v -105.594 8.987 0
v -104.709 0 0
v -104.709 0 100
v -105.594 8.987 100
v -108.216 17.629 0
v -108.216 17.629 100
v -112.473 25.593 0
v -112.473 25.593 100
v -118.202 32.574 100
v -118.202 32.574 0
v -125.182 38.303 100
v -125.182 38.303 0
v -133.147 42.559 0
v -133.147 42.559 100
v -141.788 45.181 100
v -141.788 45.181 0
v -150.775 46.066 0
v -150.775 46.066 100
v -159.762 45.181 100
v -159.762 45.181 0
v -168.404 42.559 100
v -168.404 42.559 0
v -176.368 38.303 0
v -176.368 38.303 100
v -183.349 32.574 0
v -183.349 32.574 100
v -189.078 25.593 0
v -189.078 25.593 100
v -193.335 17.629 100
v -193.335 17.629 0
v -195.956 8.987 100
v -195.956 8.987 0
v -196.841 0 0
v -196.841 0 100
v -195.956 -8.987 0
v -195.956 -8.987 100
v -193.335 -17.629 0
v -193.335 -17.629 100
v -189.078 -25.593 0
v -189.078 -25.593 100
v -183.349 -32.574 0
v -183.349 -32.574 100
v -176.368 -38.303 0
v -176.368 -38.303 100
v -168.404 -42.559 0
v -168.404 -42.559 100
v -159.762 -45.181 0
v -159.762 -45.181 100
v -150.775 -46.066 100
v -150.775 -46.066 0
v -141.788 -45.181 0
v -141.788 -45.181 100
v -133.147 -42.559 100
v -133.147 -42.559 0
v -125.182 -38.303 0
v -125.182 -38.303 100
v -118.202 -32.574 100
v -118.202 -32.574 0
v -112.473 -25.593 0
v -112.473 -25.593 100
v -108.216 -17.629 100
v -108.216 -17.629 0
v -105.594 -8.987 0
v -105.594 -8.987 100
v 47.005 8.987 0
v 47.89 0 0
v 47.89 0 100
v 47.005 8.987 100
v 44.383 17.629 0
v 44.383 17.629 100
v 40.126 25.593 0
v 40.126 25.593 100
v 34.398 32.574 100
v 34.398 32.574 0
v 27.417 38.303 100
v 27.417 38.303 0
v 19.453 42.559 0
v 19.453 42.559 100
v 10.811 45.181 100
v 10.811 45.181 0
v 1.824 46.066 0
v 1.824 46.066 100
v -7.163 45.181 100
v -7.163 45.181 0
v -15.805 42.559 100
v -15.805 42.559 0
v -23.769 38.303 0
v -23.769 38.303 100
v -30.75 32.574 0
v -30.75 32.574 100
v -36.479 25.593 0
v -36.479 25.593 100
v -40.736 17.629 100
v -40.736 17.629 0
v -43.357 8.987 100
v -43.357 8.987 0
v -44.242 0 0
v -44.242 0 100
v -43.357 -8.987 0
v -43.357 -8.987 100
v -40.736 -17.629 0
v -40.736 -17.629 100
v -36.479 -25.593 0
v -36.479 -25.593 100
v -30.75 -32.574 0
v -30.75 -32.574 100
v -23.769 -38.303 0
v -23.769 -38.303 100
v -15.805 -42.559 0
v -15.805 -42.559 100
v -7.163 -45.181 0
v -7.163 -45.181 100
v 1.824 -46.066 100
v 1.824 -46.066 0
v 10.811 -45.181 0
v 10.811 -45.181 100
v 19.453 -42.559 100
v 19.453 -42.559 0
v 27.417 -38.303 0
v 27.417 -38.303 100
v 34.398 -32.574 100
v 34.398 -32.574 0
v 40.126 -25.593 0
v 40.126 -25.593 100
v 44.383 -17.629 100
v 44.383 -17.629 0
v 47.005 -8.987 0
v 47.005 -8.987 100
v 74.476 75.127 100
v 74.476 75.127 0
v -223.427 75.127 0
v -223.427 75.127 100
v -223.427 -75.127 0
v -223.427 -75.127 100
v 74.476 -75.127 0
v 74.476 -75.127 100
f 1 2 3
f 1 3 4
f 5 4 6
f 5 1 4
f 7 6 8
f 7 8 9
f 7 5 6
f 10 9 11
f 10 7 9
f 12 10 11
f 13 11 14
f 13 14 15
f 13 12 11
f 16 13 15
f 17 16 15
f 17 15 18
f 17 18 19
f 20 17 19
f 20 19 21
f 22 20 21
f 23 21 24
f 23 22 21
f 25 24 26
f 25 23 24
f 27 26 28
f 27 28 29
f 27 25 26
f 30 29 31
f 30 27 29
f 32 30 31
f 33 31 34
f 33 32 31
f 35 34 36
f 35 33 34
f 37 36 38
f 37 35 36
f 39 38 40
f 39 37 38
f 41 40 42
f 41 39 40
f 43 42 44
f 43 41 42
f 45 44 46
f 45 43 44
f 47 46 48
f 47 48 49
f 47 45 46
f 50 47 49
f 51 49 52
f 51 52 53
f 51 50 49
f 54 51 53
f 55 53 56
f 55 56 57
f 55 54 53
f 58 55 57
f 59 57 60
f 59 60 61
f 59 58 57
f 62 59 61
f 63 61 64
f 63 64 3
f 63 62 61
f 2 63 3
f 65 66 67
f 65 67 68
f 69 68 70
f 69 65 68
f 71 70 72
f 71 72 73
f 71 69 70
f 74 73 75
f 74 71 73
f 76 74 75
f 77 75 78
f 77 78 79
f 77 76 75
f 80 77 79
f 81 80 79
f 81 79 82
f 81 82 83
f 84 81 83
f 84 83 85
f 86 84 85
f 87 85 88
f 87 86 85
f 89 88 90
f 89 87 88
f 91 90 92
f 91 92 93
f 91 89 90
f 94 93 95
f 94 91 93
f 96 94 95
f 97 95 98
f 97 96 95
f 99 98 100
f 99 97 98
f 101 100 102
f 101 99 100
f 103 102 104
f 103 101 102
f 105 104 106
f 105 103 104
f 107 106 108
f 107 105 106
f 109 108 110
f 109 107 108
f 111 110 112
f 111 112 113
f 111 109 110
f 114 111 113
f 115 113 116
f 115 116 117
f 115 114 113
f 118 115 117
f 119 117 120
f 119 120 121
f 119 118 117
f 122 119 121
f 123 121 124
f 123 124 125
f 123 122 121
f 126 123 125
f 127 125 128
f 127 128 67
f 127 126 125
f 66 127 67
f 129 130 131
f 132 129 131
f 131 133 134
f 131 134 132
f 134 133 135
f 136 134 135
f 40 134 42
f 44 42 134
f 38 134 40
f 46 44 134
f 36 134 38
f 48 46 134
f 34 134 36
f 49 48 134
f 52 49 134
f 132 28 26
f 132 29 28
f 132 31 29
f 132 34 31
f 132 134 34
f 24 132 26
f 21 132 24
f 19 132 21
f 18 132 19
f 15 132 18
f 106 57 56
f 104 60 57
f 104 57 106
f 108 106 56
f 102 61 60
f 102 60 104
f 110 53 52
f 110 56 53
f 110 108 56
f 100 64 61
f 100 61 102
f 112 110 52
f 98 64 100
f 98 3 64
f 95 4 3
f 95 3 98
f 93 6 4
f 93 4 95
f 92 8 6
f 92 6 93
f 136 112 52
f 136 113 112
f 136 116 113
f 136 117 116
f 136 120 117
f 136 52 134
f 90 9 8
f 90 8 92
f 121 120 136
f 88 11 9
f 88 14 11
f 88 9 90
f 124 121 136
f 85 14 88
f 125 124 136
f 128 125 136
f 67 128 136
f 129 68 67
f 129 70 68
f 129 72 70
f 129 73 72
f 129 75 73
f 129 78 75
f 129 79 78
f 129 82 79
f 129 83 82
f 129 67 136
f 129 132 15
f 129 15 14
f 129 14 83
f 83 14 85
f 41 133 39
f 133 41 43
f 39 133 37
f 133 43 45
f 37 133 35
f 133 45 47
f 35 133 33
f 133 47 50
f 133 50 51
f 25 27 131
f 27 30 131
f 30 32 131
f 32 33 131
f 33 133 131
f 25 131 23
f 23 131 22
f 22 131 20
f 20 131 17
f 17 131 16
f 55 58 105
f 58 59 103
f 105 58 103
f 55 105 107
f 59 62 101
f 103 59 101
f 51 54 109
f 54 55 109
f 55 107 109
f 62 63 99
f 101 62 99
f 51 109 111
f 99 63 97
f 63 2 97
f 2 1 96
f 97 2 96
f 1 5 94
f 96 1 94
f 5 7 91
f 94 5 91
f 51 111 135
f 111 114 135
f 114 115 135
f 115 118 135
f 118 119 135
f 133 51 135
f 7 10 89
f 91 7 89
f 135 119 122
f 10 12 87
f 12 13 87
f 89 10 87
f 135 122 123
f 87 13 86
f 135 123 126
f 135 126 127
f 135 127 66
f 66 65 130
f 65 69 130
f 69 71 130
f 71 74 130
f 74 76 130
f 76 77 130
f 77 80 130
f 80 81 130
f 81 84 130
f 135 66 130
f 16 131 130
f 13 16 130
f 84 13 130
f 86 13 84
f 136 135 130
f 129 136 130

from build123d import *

# Parameters (mm, degrees)
F0_W     = 148.951292
F0_H     = 150.254234
F0_R     = 46.06604
F1_DEPTH = 100


with BuildPart() as f1:
    # F0 (on Top) → F1 (new body)
    with BuildSketch(Plane.XY):
        Rectangle(F0_W, F0_H)
        with Locations((1.823949, 0)):
            Circle(F0_R, mode=Mode.SUBTRACT)
        with Locations((-148.951292, 0)):
            Rectangle(F0_W, F0_H)
        with Locations((-150.775241, 0)):
            Circle(F0_R, mode=Mode.SUBTRACT)
    extrude(amount=F1_DEPTH)


solid = f1.part
